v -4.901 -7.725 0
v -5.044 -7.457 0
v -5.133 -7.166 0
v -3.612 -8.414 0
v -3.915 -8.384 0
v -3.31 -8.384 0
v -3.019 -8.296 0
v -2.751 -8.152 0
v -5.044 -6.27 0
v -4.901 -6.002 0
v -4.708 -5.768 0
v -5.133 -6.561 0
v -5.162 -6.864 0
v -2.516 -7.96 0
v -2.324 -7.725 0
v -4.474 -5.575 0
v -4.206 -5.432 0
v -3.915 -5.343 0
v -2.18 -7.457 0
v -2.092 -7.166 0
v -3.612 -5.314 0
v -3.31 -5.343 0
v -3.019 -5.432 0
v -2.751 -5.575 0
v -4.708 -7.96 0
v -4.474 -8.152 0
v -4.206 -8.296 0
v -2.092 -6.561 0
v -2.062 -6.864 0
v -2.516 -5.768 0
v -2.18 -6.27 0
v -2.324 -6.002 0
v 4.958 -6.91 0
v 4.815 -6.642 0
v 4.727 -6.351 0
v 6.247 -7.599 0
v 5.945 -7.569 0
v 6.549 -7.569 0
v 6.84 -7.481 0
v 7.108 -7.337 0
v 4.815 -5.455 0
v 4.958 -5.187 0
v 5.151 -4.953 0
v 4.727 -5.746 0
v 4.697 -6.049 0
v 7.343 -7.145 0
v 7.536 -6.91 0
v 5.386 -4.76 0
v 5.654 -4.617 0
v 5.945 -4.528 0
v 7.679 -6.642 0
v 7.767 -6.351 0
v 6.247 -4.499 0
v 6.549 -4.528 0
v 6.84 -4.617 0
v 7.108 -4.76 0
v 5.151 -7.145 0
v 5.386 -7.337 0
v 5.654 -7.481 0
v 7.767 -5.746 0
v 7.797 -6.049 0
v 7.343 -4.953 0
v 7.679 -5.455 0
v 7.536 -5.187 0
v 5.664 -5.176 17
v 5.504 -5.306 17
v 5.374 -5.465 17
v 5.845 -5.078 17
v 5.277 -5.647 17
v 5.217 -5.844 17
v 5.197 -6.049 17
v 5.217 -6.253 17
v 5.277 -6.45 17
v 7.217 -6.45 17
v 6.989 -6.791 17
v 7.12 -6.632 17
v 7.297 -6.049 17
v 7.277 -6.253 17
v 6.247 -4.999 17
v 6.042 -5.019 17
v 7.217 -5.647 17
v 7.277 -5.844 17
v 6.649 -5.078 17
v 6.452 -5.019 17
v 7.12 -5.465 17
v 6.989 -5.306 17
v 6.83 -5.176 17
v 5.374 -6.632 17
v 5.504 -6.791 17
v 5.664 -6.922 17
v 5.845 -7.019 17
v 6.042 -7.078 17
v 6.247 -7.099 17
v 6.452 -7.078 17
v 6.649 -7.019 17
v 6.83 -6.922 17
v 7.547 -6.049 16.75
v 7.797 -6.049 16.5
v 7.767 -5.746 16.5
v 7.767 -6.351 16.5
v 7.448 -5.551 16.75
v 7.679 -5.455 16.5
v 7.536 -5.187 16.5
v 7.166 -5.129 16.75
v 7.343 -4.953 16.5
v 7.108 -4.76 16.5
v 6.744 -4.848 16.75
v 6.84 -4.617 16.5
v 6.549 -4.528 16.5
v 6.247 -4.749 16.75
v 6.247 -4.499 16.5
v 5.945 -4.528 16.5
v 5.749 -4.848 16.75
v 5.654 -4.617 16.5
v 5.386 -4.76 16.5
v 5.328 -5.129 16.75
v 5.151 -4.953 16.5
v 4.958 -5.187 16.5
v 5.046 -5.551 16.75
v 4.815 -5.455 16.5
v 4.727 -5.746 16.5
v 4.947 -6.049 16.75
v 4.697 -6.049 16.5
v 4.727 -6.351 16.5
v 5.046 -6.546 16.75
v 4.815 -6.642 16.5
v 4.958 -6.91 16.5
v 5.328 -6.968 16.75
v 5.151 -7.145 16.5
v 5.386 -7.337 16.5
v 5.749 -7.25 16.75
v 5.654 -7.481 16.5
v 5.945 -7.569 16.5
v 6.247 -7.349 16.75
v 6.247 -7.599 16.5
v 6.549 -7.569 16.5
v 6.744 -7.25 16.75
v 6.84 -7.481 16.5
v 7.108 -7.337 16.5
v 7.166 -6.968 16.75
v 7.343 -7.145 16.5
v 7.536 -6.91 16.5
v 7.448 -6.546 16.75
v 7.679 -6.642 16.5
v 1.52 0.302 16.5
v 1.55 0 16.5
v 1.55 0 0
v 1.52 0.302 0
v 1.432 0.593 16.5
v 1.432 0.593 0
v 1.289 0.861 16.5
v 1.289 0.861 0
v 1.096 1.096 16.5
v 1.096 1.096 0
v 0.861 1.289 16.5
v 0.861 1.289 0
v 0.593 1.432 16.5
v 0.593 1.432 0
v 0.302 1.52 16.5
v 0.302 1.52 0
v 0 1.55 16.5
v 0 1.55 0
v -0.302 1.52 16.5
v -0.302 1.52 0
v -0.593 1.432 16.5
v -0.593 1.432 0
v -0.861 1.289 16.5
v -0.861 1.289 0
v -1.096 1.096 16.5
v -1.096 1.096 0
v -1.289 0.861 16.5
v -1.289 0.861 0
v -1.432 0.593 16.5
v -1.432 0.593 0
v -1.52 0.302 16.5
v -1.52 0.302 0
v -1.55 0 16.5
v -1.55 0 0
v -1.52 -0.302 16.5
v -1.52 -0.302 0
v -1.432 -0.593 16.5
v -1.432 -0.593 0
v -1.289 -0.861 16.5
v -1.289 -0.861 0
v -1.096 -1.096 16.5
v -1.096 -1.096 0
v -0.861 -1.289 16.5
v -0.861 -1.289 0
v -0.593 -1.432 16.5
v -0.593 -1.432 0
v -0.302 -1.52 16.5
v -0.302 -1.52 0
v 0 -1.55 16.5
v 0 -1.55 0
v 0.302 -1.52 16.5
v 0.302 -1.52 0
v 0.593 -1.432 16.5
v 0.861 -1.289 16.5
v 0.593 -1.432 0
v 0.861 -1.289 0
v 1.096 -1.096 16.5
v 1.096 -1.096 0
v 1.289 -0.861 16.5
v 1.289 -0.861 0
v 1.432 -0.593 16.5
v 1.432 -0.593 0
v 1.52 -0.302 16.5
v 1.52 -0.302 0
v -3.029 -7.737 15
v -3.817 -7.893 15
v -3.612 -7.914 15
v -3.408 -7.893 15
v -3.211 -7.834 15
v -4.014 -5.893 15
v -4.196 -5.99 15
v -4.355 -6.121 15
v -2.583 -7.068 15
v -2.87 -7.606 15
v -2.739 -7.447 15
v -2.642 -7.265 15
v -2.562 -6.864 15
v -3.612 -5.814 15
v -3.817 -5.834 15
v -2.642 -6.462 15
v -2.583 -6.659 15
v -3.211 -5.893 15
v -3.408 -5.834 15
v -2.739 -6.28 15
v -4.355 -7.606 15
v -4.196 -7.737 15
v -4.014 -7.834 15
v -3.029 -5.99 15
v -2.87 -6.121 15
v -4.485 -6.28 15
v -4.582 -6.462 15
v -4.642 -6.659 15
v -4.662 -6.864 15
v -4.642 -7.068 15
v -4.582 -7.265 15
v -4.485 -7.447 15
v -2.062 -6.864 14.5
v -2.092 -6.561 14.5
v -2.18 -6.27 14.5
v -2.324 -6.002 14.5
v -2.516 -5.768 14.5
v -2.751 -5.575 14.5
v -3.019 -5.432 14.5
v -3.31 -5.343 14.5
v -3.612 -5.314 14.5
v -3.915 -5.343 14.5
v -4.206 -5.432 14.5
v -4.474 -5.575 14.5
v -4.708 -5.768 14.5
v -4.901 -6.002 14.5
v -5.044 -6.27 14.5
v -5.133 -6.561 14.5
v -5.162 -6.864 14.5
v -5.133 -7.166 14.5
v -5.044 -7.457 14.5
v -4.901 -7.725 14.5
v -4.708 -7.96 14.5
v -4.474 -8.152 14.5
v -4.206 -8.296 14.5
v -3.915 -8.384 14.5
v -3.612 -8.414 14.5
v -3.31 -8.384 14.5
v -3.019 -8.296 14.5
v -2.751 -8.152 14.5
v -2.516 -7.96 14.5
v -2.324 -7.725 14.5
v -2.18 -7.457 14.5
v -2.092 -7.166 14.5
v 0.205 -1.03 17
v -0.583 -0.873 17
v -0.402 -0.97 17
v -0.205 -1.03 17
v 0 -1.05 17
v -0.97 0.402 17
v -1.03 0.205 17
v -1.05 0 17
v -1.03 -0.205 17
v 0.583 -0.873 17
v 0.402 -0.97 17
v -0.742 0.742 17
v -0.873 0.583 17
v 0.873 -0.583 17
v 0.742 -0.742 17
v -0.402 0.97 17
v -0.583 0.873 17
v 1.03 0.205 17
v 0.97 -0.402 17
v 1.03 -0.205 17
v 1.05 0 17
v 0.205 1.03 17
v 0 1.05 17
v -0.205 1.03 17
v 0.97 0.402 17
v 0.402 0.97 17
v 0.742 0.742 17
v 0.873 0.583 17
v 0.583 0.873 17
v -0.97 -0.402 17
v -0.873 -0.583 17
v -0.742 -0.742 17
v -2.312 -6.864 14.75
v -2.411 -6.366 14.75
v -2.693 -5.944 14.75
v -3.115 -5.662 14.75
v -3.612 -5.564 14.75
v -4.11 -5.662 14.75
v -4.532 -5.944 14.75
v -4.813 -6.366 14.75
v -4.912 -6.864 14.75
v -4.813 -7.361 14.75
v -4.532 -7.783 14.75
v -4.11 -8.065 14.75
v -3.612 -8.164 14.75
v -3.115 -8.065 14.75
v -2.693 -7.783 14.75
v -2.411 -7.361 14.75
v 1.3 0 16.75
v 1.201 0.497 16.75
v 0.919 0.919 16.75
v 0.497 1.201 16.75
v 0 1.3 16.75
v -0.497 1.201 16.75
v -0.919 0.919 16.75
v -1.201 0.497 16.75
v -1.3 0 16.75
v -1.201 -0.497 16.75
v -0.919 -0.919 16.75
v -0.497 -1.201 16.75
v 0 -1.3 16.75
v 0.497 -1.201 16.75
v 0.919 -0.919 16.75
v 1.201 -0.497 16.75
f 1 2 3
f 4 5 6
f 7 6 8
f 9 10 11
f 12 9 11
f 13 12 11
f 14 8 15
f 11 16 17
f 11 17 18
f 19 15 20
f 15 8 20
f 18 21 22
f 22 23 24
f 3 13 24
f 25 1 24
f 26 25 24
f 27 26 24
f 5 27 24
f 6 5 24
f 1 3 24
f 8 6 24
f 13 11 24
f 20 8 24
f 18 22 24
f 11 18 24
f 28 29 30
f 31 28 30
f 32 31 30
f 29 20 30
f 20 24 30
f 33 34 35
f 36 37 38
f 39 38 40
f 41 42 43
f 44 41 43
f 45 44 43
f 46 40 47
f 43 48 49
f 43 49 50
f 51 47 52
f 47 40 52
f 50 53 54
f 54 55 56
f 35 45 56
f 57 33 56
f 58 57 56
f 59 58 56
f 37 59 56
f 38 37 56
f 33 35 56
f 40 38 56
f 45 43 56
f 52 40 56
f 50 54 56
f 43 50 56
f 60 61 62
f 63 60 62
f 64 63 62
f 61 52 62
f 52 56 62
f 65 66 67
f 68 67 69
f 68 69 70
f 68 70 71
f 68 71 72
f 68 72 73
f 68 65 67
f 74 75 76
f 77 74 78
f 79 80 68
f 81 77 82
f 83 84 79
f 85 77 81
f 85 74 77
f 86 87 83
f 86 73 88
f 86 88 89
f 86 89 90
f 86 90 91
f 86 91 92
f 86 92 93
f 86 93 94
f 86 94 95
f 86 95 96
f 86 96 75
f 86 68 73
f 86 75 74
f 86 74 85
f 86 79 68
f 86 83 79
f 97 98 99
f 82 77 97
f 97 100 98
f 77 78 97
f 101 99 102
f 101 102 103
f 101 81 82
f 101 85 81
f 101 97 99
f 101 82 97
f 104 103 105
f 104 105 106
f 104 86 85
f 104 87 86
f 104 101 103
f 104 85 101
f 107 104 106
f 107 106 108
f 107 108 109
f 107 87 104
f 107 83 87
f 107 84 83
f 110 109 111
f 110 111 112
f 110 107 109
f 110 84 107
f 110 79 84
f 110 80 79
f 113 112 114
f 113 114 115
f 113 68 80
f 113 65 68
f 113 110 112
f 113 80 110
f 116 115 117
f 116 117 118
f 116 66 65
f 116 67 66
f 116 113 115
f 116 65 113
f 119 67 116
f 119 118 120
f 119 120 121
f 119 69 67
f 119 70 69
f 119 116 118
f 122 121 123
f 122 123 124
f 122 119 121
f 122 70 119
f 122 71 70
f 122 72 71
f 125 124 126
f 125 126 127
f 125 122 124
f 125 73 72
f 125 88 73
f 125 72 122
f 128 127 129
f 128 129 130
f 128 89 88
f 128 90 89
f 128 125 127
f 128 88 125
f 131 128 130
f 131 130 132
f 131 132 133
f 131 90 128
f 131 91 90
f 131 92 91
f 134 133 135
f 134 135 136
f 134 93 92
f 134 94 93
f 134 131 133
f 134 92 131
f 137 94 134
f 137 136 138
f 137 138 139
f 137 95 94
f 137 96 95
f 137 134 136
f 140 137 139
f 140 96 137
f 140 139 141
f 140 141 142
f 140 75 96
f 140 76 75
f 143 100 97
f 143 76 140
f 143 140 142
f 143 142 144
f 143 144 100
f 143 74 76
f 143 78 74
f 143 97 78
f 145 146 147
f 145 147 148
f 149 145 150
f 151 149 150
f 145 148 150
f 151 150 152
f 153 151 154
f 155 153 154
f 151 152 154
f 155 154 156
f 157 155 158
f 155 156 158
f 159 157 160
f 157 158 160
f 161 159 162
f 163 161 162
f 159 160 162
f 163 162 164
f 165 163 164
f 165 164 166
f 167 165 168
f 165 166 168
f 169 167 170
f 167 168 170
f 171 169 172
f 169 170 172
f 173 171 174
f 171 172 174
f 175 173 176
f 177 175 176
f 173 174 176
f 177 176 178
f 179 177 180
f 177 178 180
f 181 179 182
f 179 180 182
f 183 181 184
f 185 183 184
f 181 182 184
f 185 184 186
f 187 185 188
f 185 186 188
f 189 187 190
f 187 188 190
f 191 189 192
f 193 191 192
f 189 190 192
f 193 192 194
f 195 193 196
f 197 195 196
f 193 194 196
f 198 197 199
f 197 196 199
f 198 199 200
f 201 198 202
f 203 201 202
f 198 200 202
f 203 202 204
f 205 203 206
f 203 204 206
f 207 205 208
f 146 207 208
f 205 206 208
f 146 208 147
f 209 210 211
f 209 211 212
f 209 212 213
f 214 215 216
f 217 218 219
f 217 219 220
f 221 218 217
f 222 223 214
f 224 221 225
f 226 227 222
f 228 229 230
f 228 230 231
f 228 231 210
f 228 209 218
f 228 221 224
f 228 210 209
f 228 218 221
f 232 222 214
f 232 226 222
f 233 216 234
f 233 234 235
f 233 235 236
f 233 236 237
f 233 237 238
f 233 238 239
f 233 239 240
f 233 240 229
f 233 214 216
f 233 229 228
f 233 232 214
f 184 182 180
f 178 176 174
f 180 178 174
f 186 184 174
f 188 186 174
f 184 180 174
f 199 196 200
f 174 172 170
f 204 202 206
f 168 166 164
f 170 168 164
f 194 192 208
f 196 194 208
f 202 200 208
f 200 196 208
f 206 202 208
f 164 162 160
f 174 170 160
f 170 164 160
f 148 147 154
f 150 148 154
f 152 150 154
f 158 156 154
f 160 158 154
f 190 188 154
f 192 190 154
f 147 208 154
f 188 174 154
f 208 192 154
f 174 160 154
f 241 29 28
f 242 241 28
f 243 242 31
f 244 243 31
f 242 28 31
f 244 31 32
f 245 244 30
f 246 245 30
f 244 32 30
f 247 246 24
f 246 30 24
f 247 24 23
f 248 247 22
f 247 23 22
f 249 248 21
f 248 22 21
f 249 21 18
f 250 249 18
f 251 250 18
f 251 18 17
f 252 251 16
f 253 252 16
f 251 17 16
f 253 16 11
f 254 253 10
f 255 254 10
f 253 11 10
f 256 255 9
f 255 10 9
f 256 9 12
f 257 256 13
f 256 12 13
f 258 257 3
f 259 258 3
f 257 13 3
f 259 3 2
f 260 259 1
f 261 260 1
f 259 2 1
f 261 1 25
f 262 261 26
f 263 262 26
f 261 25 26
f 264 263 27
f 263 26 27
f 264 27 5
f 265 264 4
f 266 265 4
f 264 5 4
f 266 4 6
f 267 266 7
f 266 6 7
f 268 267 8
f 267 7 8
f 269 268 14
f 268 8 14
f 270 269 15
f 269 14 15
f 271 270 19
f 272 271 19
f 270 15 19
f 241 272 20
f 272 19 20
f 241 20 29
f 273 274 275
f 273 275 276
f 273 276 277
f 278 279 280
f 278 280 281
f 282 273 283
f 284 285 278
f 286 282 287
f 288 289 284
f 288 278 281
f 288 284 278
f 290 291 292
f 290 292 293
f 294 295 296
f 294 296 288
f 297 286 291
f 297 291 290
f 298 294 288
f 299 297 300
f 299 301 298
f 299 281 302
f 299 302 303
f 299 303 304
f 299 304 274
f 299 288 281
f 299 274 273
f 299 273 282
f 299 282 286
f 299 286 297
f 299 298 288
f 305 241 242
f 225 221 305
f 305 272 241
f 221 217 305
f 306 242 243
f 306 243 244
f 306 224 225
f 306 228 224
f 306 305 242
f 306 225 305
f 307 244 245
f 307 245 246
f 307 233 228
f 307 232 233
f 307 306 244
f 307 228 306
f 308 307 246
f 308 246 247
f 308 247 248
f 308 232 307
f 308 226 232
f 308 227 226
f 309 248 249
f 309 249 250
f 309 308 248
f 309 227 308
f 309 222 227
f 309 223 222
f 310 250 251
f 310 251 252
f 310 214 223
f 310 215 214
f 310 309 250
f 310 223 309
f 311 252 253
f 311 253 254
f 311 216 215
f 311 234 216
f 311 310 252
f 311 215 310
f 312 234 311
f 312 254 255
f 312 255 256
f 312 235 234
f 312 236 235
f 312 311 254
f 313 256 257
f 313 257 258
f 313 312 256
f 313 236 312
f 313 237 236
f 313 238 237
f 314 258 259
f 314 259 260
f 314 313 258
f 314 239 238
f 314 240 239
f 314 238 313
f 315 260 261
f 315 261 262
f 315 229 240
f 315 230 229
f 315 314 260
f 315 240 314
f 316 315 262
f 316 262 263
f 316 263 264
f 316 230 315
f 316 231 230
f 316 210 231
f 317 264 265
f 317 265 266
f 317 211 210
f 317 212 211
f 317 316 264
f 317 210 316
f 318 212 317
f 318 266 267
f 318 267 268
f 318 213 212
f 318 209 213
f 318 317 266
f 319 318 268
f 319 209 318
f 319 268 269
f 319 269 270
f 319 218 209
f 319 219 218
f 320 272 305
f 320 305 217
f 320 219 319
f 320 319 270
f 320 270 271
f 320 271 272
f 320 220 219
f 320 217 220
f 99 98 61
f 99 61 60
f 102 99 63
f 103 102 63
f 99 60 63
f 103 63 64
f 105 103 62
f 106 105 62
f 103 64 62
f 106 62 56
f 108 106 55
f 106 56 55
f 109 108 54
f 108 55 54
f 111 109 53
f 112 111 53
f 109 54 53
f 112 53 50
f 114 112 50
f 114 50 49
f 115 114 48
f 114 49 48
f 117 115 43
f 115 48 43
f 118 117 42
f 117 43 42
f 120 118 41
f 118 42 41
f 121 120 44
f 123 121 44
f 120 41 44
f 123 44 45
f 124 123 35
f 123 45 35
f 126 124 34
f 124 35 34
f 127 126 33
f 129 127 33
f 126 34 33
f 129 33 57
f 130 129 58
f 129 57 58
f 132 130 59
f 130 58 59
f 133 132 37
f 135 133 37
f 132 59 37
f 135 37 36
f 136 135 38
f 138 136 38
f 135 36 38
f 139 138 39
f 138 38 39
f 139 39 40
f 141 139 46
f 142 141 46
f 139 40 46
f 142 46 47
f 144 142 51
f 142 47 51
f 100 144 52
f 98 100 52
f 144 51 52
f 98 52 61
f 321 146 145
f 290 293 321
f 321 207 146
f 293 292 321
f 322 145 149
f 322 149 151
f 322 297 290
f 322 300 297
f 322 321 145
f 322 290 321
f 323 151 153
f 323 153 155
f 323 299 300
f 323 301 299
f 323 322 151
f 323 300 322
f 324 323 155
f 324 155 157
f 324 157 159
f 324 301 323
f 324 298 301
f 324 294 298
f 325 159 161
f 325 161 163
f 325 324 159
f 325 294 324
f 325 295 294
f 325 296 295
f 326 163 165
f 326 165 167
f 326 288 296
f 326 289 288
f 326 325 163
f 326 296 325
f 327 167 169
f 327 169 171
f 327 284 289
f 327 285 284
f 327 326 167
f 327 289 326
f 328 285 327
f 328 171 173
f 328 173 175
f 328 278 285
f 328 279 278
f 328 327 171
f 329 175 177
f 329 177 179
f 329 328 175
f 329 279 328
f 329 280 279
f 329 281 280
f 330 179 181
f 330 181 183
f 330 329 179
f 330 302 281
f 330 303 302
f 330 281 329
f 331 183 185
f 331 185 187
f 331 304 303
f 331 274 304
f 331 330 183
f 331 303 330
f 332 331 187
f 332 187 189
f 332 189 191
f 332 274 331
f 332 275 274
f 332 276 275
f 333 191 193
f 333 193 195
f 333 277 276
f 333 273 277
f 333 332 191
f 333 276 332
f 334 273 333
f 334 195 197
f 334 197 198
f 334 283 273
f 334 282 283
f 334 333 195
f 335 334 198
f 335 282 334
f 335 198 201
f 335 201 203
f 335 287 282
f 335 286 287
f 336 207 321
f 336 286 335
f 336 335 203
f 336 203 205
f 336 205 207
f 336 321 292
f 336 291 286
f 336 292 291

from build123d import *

# Parameters (mm, degrees)
F0_R     = 1.55
F1_DEPTH = 17
F2_SIZE  = 0.5
F3_R     = 1.55
F4_DEPTH = 17
F5_SIZE  = 0.5
F6_R     = 1.55
F7_DEPTH = 15
F8_SIZE  = 0.5


with BuildPart() as f1:
    # F0 (on Top) → F1 (new body)
    with BuildSketch(Plane.XY):
        Circle(F0_R)
    extrude(amount=F1_DEPTH)

    # F2
    f2_edges = [f1.edges().sort_by_distance(p)[0] for p in [
        (-1.55, 0, 17),
    ]]
    chamfer(f2_edges, length=F2_SIZE)


with BuildPart() as f4:
    # F3 (on Top) → F4 (new body)
    with BuildSketch(Plane.XY):
        with Locations((6.246898, -6.048553)):
            Circle(F3_R)
    extrude(amount=F4_DEPTH)

    # F5
    f5_edges = [f4.edges().sort_by_distance(p)[0] for p in [
        (4.696898, -6.048553, 17),
    ]]
    chamfer(f5_edges, length=F5_SIZE)


with BuildPart() as f7:
    # F6 (on Top) → F7 (new body)
    with BuildSketch(Plane.XY):
        with Locations((-3.612386, -6.863532)):
            Circle(F6_R)
    extrude(amount=F7_DEPTH)

    # F8
    f8_edges = [f7.edges().sort_by_distance(p)[0] for p in [
        (-5.162386, -6.863532, 15),
    ]]
    chamfer(f8_edges, length=F8_SIZE)


solid = Compound([f1.part, f4.part, f7.part])
